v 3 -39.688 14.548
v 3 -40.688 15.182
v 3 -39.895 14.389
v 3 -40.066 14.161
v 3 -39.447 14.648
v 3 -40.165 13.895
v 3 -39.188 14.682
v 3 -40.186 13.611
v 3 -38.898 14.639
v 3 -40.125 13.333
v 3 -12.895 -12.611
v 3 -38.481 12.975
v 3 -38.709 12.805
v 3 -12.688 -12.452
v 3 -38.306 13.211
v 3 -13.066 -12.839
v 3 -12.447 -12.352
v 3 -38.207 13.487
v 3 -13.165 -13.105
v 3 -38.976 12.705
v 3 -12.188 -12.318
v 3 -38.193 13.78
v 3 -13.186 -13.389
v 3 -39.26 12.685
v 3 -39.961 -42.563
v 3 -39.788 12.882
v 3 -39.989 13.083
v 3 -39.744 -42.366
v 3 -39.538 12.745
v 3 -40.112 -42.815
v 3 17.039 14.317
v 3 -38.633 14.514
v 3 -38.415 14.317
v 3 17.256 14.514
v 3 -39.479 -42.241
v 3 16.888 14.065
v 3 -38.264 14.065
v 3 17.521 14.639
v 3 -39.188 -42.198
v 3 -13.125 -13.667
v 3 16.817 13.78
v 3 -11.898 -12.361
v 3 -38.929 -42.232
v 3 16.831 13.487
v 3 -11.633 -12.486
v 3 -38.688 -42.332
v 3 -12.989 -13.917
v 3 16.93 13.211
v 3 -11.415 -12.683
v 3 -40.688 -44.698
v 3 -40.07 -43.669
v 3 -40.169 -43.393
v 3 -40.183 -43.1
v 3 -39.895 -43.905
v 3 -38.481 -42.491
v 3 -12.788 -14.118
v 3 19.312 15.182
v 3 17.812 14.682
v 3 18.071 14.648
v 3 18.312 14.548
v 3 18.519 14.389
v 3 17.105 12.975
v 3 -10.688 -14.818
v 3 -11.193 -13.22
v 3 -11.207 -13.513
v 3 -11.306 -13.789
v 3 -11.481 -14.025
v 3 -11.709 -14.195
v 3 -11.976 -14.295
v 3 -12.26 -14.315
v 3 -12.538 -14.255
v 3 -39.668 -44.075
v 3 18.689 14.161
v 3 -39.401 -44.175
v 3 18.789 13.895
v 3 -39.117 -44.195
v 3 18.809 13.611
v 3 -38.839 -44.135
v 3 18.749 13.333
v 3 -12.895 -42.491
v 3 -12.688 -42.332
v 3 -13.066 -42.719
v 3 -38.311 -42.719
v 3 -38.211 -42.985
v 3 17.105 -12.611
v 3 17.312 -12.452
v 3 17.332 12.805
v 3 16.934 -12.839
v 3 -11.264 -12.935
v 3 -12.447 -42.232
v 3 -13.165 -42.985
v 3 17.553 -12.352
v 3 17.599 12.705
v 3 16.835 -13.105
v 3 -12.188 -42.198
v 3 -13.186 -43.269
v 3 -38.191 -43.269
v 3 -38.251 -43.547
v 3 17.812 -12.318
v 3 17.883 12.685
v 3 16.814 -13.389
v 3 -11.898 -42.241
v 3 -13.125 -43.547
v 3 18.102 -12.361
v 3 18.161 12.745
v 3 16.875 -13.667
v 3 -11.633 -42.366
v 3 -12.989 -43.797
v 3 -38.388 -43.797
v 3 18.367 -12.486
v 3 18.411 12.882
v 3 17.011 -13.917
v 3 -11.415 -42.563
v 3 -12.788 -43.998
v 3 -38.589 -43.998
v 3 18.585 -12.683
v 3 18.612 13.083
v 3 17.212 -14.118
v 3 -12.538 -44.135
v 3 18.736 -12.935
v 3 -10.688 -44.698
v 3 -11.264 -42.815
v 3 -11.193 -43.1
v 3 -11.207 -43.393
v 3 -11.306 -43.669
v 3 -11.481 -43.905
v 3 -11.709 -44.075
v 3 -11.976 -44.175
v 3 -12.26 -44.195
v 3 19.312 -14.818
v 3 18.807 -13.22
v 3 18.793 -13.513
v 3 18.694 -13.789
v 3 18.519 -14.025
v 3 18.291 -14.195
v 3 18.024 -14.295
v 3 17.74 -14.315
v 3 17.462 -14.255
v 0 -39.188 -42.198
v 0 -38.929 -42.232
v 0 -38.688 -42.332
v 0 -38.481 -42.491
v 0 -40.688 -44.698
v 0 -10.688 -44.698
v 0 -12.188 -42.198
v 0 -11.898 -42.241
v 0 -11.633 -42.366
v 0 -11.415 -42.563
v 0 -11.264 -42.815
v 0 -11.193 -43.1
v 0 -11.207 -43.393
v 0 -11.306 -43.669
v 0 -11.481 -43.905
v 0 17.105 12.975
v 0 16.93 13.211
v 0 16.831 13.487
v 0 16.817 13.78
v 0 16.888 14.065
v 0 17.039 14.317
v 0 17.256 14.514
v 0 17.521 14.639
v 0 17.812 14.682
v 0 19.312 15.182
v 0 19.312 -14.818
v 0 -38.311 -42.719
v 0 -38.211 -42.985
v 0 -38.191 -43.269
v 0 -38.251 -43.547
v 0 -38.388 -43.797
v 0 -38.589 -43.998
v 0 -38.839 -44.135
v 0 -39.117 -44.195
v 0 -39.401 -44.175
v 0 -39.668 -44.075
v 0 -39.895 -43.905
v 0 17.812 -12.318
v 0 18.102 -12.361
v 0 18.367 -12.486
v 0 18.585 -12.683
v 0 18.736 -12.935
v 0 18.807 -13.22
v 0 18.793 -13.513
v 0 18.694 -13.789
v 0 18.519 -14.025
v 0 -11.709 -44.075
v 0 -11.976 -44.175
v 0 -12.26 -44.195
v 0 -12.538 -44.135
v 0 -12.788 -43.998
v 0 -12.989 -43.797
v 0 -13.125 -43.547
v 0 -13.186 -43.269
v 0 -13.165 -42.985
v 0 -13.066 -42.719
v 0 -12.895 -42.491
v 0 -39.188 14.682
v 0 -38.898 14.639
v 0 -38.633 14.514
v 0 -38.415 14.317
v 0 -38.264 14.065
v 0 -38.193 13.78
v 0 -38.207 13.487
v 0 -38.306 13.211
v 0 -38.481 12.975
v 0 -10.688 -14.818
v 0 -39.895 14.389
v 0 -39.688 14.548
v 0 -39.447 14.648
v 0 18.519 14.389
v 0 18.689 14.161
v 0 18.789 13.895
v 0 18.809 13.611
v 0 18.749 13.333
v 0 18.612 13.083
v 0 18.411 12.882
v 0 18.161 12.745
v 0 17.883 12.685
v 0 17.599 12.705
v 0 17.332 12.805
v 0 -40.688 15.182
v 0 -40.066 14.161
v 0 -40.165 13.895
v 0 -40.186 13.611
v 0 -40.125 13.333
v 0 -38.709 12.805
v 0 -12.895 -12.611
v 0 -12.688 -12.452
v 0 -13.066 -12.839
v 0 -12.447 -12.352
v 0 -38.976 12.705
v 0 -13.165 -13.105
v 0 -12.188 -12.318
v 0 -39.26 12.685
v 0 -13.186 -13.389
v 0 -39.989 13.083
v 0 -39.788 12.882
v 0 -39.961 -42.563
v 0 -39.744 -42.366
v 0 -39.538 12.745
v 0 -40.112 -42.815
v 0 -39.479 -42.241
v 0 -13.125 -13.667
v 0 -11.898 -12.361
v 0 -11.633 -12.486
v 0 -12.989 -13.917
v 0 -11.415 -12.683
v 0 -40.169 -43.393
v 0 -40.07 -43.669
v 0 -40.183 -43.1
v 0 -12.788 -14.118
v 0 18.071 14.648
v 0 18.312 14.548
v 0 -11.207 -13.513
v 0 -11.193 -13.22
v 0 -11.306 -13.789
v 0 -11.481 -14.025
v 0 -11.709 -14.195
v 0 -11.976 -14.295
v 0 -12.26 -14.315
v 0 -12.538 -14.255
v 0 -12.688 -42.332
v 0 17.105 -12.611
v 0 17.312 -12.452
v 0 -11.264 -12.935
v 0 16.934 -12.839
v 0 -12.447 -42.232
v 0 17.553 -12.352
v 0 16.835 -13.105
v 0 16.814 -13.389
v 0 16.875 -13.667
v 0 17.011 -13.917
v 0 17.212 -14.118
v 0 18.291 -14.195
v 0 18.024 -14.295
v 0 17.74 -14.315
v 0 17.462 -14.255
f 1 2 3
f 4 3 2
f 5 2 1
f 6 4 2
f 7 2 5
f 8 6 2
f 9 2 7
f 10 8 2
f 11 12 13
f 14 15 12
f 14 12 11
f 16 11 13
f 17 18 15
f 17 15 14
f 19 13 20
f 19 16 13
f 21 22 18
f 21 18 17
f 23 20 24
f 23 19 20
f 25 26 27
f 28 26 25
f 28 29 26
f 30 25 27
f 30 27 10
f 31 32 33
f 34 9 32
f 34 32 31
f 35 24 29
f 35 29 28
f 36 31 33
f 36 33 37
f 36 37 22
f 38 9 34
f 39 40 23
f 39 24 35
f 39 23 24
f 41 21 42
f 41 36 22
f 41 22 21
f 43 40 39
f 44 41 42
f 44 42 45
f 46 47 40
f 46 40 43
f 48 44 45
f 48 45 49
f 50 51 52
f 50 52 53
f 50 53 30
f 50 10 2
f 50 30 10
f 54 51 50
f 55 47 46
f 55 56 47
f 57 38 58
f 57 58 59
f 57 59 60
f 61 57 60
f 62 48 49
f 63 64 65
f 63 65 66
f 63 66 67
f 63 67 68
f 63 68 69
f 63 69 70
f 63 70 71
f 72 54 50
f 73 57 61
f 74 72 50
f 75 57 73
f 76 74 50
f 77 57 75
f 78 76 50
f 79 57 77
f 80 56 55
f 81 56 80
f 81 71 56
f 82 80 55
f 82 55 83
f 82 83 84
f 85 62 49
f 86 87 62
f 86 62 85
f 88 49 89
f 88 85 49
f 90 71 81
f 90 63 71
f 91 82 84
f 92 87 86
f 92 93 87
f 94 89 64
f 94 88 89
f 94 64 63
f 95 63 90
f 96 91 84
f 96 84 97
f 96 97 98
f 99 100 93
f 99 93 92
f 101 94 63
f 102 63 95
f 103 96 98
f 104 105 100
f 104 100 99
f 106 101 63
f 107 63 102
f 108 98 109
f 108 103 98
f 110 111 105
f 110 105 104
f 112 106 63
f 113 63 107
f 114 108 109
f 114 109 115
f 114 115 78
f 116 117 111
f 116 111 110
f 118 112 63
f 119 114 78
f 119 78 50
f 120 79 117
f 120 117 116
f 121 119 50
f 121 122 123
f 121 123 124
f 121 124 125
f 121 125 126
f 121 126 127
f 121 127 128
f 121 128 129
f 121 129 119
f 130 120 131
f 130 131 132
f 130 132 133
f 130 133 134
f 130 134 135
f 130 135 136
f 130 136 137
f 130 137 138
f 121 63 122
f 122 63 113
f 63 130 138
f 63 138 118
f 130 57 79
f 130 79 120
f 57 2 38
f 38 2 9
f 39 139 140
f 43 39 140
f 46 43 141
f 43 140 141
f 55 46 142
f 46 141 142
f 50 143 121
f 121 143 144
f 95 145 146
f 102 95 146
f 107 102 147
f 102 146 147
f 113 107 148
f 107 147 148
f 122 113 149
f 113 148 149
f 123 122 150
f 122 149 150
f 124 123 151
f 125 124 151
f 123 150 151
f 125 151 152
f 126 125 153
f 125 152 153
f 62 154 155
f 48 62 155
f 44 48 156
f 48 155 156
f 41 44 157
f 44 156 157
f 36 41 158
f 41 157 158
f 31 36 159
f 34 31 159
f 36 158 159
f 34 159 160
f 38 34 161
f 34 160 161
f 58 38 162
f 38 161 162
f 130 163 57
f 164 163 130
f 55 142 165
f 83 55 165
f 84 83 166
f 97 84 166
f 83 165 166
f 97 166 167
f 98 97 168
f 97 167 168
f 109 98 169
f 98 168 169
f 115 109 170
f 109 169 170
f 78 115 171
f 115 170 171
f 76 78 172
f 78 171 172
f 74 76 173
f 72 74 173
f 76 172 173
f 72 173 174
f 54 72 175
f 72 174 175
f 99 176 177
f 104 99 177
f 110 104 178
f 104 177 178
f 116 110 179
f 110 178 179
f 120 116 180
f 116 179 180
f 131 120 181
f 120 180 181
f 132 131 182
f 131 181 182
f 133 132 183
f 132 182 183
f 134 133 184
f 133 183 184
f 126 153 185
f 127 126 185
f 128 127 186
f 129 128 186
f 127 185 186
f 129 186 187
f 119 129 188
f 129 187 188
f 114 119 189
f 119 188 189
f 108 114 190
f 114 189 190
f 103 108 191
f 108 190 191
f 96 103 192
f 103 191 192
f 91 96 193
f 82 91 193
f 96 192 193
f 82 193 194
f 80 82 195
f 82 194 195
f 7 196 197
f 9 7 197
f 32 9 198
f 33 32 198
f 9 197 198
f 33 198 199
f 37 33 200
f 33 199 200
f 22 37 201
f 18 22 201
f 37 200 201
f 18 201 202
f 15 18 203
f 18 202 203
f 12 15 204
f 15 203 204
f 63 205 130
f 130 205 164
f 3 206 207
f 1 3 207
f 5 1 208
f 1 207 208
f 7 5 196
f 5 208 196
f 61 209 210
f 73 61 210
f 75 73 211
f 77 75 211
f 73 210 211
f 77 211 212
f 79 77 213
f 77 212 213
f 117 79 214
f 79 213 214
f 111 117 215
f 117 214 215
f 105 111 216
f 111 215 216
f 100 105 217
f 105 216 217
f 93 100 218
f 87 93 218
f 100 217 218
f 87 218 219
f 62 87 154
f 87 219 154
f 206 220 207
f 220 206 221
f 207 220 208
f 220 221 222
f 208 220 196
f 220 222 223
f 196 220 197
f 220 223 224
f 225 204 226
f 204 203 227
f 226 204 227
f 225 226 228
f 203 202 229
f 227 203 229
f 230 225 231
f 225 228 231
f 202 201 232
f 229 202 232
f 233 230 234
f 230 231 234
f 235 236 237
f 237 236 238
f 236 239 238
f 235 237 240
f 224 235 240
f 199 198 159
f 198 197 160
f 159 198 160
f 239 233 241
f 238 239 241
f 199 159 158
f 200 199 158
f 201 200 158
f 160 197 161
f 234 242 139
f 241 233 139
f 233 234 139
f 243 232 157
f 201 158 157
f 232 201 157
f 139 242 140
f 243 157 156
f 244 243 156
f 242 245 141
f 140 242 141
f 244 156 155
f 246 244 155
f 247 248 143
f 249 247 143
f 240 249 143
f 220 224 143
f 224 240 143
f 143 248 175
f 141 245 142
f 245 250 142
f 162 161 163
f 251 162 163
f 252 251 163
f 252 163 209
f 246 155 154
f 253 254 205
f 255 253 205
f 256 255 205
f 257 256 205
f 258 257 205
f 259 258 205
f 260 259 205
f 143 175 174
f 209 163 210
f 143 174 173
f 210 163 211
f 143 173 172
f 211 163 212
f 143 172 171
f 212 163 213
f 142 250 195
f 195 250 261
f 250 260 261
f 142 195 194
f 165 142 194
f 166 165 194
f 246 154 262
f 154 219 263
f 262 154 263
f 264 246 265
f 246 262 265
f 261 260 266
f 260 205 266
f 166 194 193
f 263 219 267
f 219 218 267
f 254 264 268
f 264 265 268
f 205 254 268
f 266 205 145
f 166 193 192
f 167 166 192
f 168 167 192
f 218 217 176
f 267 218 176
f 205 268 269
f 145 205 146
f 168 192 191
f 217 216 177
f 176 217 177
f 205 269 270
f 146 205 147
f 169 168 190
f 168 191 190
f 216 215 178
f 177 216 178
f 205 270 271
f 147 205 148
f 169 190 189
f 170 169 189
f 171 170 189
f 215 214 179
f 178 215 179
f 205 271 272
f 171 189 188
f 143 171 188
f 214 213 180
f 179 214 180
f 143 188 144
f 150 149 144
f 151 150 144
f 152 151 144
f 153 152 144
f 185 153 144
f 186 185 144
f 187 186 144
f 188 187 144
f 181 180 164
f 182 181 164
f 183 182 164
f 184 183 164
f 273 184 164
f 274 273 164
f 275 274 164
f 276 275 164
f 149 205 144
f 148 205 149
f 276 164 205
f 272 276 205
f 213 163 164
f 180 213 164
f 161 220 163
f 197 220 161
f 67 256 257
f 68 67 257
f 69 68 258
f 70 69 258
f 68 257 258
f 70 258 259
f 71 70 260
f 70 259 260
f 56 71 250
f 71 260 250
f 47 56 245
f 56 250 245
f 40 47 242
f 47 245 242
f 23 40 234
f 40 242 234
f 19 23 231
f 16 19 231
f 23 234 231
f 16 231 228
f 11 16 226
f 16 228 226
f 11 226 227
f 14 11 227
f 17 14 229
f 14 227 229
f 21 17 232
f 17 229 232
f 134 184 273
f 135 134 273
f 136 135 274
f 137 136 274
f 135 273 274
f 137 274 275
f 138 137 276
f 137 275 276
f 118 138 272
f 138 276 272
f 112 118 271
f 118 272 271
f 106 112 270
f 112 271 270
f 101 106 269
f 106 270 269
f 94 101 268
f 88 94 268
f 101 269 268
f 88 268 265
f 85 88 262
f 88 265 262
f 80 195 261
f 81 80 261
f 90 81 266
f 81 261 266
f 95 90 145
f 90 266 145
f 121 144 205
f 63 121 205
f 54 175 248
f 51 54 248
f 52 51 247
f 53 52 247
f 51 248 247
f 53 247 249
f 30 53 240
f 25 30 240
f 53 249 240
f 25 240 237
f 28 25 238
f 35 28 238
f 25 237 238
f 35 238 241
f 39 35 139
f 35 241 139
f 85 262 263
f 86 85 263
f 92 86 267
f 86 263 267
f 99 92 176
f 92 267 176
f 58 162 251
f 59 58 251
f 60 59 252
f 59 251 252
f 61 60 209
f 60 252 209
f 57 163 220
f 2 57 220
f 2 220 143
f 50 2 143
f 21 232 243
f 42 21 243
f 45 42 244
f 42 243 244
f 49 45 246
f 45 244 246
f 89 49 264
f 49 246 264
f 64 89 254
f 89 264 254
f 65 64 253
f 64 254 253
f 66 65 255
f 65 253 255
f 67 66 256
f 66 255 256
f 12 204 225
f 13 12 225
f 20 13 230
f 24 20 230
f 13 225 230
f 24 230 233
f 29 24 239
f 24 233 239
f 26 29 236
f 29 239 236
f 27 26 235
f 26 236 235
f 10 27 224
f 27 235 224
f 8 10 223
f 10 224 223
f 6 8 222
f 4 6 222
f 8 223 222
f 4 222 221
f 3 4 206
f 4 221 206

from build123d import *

# Parameters (mm, degrees)
ESQUISSE1_W             = 29.88
ESQUISSE1_H             = 30
ESQUISSE1_W_2           = 30
BOSS_EXTRU_1_DEPTH      = 3
ENL_V_MAT_EXTRU_1_DEPTH = 3


with BuildPart() as part:
    # Esquisse1 → Boss.-Extru.1 (new body)
    with BuildSketch(Plane(origin=(0, 0, 0), x_dir=(0, 0, -1), z_dir=(1, 0, 0))):
        with Locations((29.757813765, -25.688259109)):
            Rectangle(ESQUISSE1_W, ESQUISSE1_H)
        with Locations((-0.182186235, -25.688259109)):
            Rectangle(ESQUISSE1_W_2, ESQUISSE1_H)
        with Locations((-0.182186235, 4.311740891)):
            Rectangle(ESQUISSE1_W_2, ESQUISSE1_H)
    extrude(amount=BOSS_EXTRU_1_DEPTH)

    # Esquisse2 → Enlèv. mat.-Extru.1 (cut)
    with BuildSketch(Plane.ZY):
        with BuildLine():
            ThreePointArc((-42.197813765, -39.188259109), (-42.273934233, -38.805575677), (-42.490706984, -38.481152328))
            Line((-42.490706984, -38.481152328), (-43.904920546, -39.89536589))
            ThreePointArc((-43.904920546, -39.89536589), (-42.815130333, -40.112138642), (-42.197813765, -39.188259109))
        make_face()
        with BuildLine():
            Line((-43.904920546, -39.89536589), (-42.490706984, -38.481152328))
            ThreePointArc((-42.490706984, -38.481152328), (-43.904920546, -38.481152328), (-43.904920546, -39.89536589))
        make_face()
        with BuildLine():
            ThreePointArc((-43.904920546, -11.481152328), (-43.904920546, -12.89536589), (-42.490706984, -12.89536589))
            Line((-42.490706984, -12.89536589), (-43.904920546, -11.481152328))
        make_face()
        with BuildLine():
            Line((-43.904920546, -11.481152328), (-42.490706984, -12.89536589))
            ThreePointArc((-42.490706984, -12.89536589), (-42.273934233, -12.570942542), (-42.197813765, -12.188259109))
            ThreePointArc((-42.197813765, -12.188259109), (-42.815130333, -11.264379577), (-43.904920546, -11.481152328))
        make_face()
        with BuildLine():
            ThreePointArc((-14.024920546, -11.481152328), (-14.024920546, -12.89536589), (-12.610706984, -12.89536589))
            Line((-12.610706984, -12.89536589), (-14.024920546, -11.481152328))
        make_face()
        with BuildLine():
            Line((-14.024920546, -11.481152328), (-12.610706984, -12.89536589))
            ThreePointArc((-12.610706984, -12.89536589), (-12.393934233, -12.570942542), (-12.317813765, -12.188259109))
            ThreePointArc((-12.317813765, -12.188259109), (-12.935130333, -11.264379577), (-14.024920546, -11.481152328))
        make_face()
        with BuildLine():
            ThreePointArc((-14.024920546, 18.518847672), (-14.024920546, 17.10463411), (-12.610706984, 17.10463411))
            Line((-12.610706984, 17.10463411), (-14.024920546, 18.518847672))
        make_face()
        with BuildLine():
            Line((-14.024920546, 18.518847672), (-12.610706984, 17.10463411))
            ThreePointArc((-12.610706984, 17.10463411), (-12.393934233, 17.429057458), (-12.317813765, 17.811740891))
            ThreePointArc((-12.317813765, 17.811740891), (-12.935130333, 18.735620423), (-14.024920546, 18.518847672))
        make_face()
        with BuildLine():
            ThreePointArc((14.389293016, 18.518847672), (12.975079454, 18.518847672), (12.975079454, 17.10463411))
            Line((12.975079454, 17.10463411), (14.389293016, 18.518847672))
        make_face()
        with BuildLine():
            Line((14.389293016, 18.518847672), (12.975079454, 17.10463411))
            ThreePointArc((12.975079454, 17.10463411), (14.064869667, 16.887861358), (14.682186235, 17.811740891))
            ThreePointArc((14.682186235, 17.811740891), (14.606065767, 18.194424323), (14.389293016, 18.518847672))
        make_face()
        with BuildLine():
            ThreePointArc((14.682186235, -39.188259109), (14.064869667, -38.264379577), (12.975079454, -38.481152328))
            Line((12.975079454, -38.481152328), (14.389293016, -39.89536589))
            ThreePointArc((14.389293016, -39.89536589), (14.606065767, -39.570942542), (14.682186235, -39.188259109))
        make_face()
        with BuildLine():
            Line((14.389293016, -39.89536589), (12.975079454, -38.481152328))
            ThreePointArc((12.975079454, -38.481152328), (12.975079454, -39.89536589), (14.389293016, -39.89536589))
        make_face()
    extrude(amount=-ENL_V_MAT_EXTRU_1_DEPTH, mode=Mode.SUBTRACT)


solid = part.part
